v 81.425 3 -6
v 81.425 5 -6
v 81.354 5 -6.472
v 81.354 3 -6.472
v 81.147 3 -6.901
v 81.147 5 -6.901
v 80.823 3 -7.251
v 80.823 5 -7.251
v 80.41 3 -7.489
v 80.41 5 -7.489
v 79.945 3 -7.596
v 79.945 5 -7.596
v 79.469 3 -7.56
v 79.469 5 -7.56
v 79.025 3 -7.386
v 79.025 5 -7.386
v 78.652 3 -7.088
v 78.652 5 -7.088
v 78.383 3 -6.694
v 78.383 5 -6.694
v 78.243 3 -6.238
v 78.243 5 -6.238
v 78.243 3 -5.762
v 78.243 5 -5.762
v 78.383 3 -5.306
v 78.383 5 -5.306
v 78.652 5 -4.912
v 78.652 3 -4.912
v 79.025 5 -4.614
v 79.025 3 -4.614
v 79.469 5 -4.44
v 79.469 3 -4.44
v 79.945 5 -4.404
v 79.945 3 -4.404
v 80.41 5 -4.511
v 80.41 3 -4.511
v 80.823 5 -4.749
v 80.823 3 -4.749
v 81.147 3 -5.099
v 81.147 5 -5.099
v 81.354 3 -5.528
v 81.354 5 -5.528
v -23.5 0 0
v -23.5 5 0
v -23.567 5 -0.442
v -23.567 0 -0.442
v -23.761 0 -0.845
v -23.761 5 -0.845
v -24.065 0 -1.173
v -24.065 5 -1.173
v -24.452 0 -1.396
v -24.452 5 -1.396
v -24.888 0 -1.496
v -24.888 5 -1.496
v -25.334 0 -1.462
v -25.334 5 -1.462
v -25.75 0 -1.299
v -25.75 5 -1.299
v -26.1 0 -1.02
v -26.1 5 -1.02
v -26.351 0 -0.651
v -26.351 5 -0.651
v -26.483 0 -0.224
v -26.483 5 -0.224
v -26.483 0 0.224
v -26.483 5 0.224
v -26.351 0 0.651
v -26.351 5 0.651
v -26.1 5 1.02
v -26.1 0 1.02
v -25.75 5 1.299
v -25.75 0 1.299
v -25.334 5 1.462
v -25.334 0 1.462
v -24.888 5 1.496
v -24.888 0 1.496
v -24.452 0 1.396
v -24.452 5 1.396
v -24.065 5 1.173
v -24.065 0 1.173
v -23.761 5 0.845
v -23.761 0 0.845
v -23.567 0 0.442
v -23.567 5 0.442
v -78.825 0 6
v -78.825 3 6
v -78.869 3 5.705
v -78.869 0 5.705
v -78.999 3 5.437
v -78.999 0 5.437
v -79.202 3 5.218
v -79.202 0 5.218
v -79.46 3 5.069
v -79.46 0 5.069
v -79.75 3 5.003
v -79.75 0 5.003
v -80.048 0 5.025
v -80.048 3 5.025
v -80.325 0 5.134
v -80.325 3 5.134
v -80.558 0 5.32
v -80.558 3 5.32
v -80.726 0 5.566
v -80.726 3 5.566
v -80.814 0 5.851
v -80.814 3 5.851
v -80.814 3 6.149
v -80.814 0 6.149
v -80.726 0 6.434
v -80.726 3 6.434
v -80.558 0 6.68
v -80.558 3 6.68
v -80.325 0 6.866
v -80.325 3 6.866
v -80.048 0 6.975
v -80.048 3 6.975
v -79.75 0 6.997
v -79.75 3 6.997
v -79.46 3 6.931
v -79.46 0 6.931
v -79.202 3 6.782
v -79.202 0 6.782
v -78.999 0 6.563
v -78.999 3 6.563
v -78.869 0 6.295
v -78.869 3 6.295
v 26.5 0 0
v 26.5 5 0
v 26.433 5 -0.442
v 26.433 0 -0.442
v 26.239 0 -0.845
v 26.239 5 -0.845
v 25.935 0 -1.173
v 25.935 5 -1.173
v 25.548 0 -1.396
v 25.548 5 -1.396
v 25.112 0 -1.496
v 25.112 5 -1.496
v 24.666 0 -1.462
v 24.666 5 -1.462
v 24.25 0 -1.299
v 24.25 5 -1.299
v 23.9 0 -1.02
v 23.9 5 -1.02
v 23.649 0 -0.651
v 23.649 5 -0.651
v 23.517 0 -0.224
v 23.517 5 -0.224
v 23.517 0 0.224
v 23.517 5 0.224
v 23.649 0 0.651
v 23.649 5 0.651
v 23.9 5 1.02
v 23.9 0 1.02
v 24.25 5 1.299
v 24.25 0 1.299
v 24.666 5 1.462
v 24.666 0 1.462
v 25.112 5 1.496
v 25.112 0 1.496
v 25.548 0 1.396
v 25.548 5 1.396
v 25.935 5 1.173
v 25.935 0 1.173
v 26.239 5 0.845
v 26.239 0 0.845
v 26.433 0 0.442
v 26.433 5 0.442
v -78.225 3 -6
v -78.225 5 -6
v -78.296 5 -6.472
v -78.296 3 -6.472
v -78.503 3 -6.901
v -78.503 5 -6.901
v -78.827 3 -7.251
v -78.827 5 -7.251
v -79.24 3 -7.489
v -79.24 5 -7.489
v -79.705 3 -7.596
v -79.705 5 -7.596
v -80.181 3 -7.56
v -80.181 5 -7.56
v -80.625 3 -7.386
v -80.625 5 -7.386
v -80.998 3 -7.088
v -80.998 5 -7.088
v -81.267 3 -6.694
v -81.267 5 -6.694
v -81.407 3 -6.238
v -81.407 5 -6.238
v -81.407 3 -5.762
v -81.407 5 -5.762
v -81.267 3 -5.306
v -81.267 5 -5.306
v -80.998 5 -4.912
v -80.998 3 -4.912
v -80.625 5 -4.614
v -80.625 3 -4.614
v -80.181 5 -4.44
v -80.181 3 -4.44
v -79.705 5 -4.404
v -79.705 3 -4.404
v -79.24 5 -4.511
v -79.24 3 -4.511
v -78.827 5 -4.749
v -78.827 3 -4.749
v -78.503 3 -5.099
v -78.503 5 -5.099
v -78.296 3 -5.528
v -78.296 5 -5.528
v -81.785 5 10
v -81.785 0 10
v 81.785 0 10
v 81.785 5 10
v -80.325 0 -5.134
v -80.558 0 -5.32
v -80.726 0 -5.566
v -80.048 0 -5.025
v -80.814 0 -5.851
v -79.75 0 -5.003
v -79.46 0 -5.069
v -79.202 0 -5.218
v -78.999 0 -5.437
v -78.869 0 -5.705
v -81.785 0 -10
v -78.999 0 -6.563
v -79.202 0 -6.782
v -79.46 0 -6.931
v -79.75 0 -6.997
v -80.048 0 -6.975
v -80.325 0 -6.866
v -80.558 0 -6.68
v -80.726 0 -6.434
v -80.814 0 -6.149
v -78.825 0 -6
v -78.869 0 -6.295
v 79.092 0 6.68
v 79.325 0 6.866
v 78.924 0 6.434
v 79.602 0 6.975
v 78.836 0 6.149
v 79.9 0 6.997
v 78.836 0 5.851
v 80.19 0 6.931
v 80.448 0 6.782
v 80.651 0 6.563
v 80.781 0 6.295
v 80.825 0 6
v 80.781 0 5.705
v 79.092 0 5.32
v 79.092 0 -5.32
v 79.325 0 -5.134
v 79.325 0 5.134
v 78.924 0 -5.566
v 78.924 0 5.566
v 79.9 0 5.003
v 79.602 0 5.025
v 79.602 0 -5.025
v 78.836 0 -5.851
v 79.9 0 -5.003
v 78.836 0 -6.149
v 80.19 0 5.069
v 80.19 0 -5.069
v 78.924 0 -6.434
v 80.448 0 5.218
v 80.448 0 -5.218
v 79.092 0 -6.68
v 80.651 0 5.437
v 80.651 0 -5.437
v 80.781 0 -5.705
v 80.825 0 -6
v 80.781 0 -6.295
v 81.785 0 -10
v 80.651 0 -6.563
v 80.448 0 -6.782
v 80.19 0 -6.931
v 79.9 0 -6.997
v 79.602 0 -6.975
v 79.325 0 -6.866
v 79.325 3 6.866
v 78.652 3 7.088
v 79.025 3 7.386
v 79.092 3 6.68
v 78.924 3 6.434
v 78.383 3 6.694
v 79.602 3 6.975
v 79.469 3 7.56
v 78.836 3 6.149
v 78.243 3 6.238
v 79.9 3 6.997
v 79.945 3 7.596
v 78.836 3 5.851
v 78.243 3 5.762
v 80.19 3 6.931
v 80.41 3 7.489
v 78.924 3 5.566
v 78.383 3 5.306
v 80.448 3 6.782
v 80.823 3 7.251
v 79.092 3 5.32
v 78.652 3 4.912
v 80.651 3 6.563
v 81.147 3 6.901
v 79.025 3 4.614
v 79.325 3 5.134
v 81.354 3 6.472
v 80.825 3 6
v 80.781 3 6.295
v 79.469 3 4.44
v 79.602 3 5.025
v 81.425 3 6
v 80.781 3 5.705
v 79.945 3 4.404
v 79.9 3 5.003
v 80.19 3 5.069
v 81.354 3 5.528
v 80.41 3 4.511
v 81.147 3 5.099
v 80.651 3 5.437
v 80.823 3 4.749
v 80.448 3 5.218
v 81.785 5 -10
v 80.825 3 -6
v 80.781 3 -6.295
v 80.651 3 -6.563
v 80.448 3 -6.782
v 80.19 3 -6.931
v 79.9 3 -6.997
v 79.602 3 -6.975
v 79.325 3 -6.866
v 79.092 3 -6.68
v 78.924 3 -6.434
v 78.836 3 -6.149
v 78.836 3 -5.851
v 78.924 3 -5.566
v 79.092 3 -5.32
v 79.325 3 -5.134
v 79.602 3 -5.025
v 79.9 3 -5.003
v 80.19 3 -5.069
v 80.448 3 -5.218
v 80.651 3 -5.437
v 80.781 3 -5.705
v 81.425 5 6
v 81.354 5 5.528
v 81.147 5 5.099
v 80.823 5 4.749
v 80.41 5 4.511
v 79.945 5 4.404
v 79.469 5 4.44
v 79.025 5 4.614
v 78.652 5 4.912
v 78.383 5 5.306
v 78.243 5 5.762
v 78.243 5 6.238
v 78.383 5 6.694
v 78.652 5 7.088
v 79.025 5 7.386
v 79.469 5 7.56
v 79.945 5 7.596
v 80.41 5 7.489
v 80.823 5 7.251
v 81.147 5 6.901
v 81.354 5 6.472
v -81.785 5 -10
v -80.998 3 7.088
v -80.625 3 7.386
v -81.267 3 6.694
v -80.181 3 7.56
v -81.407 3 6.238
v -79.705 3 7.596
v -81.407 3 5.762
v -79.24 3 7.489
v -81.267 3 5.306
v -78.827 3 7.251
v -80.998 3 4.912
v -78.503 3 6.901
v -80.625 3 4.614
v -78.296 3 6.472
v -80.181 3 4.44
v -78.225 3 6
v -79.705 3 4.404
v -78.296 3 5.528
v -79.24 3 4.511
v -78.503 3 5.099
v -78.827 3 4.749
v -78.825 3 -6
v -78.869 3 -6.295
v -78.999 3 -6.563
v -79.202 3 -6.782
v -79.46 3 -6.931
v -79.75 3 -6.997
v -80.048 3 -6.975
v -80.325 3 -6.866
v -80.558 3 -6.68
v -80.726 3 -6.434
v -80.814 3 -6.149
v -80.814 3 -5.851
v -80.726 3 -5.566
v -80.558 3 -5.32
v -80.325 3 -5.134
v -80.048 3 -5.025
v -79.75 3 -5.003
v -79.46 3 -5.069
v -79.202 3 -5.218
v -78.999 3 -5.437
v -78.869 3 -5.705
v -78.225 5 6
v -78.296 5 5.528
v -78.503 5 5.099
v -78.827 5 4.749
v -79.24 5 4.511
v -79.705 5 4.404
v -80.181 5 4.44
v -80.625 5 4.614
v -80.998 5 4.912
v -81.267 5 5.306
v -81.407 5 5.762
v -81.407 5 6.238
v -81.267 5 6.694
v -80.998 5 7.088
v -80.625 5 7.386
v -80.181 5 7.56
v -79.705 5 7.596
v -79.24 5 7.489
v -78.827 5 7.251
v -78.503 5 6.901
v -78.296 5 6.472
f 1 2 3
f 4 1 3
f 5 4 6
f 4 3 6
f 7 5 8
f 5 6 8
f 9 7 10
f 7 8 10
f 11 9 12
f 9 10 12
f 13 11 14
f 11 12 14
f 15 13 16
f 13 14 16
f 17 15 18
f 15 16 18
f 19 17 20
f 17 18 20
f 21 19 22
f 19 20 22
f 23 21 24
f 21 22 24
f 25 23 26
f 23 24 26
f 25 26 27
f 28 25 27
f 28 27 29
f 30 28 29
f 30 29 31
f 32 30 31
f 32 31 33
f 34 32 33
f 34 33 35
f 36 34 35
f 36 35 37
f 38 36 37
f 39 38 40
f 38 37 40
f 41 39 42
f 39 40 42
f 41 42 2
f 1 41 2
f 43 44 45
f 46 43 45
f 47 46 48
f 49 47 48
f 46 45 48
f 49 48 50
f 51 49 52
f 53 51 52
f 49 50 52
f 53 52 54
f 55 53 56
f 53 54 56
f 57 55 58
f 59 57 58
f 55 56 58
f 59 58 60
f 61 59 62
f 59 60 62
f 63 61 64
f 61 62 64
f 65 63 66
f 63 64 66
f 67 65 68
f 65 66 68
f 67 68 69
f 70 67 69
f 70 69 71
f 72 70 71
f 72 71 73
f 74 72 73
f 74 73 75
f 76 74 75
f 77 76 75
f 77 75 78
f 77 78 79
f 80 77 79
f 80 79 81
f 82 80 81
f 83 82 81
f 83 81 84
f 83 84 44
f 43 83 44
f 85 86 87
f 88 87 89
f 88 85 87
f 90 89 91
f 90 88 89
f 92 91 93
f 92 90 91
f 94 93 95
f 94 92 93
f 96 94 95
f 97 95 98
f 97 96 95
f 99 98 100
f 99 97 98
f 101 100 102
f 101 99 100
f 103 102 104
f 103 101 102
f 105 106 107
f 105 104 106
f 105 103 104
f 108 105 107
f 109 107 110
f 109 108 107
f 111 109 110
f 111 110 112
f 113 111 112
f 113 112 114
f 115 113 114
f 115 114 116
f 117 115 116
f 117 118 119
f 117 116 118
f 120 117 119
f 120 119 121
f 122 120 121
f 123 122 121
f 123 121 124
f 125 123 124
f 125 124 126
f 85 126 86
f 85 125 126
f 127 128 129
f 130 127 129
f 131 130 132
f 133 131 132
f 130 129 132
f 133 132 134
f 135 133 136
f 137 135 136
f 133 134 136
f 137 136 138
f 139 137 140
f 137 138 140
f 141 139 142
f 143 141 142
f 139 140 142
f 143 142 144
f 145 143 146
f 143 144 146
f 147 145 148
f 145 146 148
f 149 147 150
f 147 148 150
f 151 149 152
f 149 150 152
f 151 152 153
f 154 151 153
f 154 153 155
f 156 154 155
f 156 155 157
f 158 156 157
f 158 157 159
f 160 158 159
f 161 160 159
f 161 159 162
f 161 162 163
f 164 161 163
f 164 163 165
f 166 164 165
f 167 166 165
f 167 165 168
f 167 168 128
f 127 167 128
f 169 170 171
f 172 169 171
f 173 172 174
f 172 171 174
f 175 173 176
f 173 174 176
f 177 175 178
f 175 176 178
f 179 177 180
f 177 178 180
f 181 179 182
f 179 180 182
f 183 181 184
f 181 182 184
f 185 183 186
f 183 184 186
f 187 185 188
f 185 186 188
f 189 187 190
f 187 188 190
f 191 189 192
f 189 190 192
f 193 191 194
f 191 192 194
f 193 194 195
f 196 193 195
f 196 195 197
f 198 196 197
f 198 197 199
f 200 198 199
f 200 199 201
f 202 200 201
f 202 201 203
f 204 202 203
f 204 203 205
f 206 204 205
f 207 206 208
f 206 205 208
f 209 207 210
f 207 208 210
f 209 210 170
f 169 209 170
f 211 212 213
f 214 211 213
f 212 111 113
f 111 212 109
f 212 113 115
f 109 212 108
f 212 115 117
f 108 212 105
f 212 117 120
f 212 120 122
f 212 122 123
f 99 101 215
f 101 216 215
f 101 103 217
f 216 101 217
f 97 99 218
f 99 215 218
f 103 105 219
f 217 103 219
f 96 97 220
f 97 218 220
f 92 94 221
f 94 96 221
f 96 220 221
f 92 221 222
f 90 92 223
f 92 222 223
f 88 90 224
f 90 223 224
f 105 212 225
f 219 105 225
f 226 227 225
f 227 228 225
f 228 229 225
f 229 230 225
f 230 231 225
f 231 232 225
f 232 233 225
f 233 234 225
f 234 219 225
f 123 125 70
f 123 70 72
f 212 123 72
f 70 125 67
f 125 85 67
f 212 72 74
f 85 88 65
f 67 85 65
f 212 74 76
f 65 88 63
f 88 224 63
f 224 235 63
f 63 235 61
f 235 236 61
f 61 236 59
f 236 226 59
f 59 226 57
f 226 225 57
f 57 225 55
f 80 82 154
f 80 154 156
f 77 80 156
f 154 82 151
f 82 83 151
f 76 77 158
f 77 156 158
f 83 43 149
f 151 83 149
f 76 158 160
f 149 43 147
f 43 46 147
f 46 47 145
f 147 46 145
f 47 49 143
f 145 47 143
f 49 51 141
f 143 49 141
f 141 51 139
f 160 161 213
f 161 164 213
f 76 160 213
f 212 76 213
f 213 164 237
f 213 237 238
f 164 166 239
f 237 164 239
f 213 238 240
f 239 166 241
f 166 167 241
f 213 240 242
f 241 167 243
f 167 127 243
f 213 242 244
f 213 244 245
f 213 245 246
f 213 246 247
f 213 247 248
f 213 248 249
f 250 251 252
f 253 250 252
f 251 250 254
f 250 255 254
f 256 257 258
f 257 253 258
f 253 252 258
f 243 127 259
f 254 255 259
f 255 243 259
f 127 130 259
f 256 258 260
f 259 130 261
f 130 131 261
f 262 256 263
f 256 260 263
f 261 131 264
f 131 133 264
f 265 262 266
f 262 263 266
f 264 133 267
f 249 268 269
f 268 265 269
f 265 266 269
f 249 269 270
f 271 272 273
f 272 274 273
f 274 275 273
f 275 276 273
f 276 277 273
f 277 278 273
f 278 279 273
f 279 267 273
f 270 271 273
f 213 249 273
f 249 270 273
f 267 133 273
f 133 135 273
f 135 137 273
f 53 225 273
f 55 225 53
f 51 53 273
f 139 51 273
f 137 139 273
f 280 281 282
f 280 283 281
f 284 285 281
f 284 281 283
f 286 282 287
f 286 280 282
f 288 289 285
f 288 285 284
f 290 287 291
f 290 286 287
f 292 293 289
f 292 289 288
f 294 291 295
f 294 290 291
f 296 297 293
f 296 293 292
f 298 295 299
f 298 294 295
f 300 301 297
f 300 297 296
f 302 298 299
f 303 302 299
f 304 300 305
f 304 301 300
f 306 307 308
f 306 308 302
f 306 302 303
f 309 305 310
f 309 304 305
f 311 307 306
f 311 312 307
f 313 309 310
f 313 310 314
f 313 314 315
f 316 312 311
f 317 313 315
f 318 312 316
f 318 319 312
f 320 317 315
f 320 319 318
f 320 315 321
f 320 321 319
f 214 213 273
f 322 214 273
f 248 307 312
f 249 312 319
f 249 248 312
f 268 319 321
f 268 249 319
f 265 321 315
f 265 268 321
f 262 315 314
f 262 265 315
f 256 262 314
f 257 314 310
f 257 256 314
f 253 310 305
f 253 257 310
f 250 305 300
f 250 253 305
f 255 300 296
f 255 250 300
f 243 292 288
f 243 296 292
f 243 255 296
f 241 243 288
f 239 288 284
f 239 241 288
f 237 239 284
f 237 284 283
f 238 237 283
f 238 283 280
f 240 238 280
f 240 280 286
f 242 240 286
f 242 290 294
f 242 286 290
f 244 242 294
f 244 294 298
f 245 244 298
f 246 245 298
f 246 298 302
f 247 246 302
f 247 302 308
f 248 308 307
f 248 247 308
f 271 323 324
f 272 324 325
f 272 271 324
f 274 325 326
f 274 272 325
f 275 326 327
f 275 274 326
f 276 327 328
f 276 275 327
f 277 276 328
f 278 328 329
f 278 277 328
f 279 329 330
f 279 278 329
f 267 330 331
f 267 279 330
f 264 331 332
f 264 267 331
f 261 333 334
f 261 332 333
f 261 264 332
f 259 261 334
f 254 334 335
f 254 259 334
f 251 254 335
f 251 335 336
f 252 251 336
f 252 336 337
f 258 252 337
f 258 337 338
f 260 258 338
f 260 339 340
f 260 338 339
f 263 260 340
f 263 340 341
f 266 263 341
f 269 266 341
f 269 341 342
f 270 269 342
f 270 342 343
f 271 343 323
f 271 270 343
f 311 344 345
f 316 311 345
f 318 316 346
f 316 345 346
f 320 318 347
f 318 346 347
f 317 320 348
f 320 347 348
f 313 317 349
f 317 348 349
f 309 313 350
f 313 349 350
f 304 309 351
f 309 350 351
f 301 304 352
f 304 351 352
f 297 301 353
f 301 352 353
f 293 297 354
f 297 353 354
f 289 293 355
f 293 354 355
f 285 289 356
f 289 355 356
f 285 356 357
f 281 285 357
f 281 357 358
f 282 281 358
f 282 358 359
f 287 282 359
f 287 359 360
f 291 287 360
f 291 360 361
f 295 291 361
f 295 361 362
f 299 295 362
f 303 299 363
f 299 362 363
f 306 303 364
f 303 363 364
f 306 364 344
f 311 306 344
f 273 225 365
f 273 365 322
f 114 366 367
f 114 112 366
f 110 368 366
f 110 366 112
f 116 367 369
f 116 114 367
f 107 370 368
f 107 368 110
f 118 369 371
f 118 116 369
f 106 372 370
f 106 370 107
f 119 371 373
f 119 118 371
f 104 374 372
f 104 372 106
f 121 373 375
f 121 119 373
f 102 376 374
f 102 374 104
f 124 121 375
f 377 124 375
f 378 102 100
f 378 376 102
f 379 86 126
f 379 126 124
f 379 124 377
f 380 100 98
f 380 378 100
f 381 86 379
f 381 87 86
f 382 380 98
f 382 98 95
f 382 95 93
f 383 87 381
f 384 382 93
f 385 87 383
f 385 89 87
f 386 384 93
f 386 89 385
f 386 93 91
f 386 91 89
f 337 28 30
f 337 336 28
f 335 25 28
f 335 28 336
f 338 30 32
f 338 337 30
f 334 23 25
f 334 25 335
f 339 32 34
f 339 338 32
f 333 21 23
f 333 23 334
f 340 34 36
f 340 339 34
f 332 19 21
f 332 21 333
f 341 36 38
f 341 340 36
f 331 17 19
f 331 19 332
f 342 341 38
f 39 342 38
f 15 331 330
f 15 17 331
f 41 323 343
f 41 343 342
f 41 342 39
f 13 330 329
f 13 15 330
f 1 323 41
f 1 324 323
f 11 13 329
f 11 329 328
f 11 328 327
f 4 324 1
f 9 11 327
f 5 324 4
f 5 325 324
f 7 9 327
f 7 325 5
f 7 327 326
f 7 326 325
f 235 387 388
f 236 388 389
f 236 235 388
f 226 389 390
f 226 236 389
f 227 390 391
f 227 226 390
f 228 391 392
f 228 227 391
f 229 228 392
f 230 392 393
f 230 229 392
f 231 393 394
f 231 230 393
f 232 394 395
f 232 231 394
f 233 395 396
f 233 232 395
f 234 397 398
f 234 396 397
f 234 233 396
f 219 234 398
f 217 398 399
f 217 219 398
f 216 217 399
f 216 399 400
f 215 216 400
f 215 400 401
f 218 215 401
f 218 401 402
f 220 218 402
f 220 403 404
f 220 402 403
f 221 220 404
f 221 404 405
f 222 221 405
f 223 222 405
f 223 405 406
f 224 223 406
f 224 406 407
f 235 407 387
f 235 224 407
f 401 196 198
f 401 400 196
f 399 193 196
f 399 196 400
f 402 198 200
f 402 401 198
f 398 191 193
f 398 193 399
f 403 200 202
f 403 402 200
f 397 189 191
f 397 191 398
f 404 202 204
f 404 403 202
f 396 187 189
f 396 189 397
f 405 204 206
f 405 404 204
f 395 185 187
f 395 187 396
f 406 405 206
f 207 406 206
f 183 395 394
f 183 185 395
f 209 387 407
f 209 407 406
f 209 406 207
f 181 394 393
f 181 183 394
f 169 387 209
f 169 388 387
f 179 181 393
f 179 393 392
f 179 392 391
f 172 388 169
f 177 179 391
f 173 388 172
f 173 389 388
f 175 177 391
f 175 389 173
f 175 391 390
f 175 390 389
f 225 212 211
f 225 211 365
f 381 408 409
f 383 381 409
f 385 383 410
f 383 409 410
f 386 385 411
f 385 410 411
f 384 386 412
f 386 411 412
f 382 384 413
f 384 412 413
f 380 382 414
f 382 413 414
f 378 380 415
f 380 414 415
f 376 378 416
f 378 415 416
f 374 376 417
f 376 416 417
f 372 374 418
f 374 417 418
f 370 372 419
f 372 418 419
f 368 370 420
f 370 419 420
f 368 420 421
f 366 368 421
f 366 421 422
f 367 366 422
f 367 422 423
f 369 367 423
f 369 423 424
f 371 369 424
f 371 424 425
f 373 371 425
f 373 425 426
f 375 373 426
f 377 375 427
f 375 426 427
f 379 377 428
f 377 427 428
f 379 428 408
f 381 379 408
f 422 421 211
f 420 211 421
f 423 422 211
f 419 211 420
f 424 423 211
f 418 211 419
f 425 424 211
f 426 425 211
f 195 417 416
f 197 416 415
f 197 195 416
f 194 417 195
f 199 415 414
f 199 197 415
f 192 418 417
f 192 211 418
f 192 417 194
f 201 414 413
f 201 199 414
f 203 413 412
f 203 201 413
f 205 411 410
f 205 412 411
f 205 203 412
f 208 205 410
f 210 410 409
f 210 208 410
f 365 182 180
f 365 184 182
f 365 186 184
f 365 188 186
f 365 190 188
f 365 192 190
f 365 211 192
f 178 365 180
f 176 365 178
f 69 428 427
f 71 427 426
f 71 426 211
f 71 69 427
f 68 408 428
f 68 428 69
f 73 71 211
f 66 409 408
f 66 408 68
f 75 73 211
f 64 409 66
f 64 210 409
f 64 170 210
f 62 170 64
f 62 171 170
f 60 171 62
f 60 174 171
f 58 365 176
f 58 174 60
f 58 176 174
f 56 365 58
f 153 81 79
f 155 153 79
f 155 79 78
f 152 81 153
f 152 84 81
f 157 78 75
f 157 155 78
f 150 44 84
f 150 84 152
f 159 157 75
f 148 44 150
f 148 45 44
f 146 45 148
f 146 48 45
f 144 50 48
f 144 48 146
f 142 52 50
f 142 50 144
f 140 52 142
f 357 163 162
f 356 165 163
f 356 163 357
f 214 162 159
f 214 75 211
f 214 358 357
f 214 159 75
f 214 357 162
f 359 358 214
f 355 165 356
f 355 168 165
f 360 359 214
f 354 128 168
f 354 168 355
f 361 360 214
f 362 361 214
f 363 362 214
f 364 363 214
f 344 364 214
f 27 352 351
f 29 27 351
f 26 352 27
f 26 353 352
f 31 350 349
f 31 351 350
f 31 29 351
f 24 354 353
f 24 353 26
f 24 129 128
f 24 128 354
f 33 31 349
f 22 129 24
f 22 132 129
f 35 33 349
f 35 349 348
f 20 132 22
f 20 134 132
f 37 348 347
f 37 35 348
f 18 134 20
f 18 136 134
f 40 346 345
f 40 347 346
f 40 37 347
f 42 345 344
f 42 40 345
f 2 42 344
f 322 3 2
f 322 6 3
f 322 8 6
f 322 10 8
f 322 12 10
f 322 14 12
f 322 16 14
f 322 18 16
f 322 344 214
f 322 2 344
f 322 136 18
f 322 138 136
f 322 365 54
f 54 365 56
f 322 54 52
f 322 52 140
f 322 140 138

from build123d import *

# Parameters (mm, degrees)
SKETCH1_W           = 163.57
SKETCH1_H           = 20
SKETCH1_R           = 1
BOSS_EXTRUDE1_DEPTH = 5
SKETCH2_R           = 1.6
CUT_EXTRUDE1_DEPTH  = 2
SKETCH3_R           = 1.5
CUT_EXTRUDE2_DEPTH  = 10


with BuildPart() as part:
    # Sketch1 → Boss-Extrude1 (new body)
    with BuildSketch(Plane(origin=(0, 0, 0), x_dir=(1, 0, 0), z_dir=(0, 1, 0))):
        Rectangle(SKETCH1_W, SKETCH1_H)
        with Locations((-79.825, 6)):
            Circle(SKETCH1_R, mode=Mode.SUBTRACT)
        with Locations((-79.825, -6)):
            Circle(SKETCH1_R, mode=Mode.SUBTRACT)
        with Locations((79.825, 6)):
            Circle(SKETCH1_R, mode=Mode.SUBTRACT)
        with Locations((79.825, -6)):
            Circle(SKETCH1_R, mode=Mode.SUBTRACT)
    extrude(amount=BOSS_EXTRUDE1_DEPTH)

    # Sketch2 → Cut-Extrude1 (cut)
    with BuildSketch(Plane(origin=(0, 5, 0), x_dir=(1, 0, 0), z_dir=(0, 1, 0))):
        with Locations((-79.825, 6)):
            Circle(SKETCH2_R)
        with Locations((-79.825, -6)):
            Circle(SKETCH2_R)
        with Locations((79.825, 6)):
            Circle(SKETCH2_R)
        with Locations((79.825, -6)):
            Circle(SKETCH2_R)
    extrude(amount=-CUT_EXTRUDE1_DEPTH, mode=Mode.SUBTRACT)

    # Sketch3 → Cut-Extrude2 (cut)
    with BuildSketch(Plane(origin=(0, 5, 0), x_dir=(1, 0, 0), z_dir=(0, 1, 0))):
        with Locations((-25, 0)):
            Circle(SKETCH3_R)
        with Locations((25, 0)):
            Circle(SKETCH3_R)
    extrude(amount=-CUT_EXTRUDE2_DEPTH, mode=Mode.SUBTRACT)


solid = part.part
